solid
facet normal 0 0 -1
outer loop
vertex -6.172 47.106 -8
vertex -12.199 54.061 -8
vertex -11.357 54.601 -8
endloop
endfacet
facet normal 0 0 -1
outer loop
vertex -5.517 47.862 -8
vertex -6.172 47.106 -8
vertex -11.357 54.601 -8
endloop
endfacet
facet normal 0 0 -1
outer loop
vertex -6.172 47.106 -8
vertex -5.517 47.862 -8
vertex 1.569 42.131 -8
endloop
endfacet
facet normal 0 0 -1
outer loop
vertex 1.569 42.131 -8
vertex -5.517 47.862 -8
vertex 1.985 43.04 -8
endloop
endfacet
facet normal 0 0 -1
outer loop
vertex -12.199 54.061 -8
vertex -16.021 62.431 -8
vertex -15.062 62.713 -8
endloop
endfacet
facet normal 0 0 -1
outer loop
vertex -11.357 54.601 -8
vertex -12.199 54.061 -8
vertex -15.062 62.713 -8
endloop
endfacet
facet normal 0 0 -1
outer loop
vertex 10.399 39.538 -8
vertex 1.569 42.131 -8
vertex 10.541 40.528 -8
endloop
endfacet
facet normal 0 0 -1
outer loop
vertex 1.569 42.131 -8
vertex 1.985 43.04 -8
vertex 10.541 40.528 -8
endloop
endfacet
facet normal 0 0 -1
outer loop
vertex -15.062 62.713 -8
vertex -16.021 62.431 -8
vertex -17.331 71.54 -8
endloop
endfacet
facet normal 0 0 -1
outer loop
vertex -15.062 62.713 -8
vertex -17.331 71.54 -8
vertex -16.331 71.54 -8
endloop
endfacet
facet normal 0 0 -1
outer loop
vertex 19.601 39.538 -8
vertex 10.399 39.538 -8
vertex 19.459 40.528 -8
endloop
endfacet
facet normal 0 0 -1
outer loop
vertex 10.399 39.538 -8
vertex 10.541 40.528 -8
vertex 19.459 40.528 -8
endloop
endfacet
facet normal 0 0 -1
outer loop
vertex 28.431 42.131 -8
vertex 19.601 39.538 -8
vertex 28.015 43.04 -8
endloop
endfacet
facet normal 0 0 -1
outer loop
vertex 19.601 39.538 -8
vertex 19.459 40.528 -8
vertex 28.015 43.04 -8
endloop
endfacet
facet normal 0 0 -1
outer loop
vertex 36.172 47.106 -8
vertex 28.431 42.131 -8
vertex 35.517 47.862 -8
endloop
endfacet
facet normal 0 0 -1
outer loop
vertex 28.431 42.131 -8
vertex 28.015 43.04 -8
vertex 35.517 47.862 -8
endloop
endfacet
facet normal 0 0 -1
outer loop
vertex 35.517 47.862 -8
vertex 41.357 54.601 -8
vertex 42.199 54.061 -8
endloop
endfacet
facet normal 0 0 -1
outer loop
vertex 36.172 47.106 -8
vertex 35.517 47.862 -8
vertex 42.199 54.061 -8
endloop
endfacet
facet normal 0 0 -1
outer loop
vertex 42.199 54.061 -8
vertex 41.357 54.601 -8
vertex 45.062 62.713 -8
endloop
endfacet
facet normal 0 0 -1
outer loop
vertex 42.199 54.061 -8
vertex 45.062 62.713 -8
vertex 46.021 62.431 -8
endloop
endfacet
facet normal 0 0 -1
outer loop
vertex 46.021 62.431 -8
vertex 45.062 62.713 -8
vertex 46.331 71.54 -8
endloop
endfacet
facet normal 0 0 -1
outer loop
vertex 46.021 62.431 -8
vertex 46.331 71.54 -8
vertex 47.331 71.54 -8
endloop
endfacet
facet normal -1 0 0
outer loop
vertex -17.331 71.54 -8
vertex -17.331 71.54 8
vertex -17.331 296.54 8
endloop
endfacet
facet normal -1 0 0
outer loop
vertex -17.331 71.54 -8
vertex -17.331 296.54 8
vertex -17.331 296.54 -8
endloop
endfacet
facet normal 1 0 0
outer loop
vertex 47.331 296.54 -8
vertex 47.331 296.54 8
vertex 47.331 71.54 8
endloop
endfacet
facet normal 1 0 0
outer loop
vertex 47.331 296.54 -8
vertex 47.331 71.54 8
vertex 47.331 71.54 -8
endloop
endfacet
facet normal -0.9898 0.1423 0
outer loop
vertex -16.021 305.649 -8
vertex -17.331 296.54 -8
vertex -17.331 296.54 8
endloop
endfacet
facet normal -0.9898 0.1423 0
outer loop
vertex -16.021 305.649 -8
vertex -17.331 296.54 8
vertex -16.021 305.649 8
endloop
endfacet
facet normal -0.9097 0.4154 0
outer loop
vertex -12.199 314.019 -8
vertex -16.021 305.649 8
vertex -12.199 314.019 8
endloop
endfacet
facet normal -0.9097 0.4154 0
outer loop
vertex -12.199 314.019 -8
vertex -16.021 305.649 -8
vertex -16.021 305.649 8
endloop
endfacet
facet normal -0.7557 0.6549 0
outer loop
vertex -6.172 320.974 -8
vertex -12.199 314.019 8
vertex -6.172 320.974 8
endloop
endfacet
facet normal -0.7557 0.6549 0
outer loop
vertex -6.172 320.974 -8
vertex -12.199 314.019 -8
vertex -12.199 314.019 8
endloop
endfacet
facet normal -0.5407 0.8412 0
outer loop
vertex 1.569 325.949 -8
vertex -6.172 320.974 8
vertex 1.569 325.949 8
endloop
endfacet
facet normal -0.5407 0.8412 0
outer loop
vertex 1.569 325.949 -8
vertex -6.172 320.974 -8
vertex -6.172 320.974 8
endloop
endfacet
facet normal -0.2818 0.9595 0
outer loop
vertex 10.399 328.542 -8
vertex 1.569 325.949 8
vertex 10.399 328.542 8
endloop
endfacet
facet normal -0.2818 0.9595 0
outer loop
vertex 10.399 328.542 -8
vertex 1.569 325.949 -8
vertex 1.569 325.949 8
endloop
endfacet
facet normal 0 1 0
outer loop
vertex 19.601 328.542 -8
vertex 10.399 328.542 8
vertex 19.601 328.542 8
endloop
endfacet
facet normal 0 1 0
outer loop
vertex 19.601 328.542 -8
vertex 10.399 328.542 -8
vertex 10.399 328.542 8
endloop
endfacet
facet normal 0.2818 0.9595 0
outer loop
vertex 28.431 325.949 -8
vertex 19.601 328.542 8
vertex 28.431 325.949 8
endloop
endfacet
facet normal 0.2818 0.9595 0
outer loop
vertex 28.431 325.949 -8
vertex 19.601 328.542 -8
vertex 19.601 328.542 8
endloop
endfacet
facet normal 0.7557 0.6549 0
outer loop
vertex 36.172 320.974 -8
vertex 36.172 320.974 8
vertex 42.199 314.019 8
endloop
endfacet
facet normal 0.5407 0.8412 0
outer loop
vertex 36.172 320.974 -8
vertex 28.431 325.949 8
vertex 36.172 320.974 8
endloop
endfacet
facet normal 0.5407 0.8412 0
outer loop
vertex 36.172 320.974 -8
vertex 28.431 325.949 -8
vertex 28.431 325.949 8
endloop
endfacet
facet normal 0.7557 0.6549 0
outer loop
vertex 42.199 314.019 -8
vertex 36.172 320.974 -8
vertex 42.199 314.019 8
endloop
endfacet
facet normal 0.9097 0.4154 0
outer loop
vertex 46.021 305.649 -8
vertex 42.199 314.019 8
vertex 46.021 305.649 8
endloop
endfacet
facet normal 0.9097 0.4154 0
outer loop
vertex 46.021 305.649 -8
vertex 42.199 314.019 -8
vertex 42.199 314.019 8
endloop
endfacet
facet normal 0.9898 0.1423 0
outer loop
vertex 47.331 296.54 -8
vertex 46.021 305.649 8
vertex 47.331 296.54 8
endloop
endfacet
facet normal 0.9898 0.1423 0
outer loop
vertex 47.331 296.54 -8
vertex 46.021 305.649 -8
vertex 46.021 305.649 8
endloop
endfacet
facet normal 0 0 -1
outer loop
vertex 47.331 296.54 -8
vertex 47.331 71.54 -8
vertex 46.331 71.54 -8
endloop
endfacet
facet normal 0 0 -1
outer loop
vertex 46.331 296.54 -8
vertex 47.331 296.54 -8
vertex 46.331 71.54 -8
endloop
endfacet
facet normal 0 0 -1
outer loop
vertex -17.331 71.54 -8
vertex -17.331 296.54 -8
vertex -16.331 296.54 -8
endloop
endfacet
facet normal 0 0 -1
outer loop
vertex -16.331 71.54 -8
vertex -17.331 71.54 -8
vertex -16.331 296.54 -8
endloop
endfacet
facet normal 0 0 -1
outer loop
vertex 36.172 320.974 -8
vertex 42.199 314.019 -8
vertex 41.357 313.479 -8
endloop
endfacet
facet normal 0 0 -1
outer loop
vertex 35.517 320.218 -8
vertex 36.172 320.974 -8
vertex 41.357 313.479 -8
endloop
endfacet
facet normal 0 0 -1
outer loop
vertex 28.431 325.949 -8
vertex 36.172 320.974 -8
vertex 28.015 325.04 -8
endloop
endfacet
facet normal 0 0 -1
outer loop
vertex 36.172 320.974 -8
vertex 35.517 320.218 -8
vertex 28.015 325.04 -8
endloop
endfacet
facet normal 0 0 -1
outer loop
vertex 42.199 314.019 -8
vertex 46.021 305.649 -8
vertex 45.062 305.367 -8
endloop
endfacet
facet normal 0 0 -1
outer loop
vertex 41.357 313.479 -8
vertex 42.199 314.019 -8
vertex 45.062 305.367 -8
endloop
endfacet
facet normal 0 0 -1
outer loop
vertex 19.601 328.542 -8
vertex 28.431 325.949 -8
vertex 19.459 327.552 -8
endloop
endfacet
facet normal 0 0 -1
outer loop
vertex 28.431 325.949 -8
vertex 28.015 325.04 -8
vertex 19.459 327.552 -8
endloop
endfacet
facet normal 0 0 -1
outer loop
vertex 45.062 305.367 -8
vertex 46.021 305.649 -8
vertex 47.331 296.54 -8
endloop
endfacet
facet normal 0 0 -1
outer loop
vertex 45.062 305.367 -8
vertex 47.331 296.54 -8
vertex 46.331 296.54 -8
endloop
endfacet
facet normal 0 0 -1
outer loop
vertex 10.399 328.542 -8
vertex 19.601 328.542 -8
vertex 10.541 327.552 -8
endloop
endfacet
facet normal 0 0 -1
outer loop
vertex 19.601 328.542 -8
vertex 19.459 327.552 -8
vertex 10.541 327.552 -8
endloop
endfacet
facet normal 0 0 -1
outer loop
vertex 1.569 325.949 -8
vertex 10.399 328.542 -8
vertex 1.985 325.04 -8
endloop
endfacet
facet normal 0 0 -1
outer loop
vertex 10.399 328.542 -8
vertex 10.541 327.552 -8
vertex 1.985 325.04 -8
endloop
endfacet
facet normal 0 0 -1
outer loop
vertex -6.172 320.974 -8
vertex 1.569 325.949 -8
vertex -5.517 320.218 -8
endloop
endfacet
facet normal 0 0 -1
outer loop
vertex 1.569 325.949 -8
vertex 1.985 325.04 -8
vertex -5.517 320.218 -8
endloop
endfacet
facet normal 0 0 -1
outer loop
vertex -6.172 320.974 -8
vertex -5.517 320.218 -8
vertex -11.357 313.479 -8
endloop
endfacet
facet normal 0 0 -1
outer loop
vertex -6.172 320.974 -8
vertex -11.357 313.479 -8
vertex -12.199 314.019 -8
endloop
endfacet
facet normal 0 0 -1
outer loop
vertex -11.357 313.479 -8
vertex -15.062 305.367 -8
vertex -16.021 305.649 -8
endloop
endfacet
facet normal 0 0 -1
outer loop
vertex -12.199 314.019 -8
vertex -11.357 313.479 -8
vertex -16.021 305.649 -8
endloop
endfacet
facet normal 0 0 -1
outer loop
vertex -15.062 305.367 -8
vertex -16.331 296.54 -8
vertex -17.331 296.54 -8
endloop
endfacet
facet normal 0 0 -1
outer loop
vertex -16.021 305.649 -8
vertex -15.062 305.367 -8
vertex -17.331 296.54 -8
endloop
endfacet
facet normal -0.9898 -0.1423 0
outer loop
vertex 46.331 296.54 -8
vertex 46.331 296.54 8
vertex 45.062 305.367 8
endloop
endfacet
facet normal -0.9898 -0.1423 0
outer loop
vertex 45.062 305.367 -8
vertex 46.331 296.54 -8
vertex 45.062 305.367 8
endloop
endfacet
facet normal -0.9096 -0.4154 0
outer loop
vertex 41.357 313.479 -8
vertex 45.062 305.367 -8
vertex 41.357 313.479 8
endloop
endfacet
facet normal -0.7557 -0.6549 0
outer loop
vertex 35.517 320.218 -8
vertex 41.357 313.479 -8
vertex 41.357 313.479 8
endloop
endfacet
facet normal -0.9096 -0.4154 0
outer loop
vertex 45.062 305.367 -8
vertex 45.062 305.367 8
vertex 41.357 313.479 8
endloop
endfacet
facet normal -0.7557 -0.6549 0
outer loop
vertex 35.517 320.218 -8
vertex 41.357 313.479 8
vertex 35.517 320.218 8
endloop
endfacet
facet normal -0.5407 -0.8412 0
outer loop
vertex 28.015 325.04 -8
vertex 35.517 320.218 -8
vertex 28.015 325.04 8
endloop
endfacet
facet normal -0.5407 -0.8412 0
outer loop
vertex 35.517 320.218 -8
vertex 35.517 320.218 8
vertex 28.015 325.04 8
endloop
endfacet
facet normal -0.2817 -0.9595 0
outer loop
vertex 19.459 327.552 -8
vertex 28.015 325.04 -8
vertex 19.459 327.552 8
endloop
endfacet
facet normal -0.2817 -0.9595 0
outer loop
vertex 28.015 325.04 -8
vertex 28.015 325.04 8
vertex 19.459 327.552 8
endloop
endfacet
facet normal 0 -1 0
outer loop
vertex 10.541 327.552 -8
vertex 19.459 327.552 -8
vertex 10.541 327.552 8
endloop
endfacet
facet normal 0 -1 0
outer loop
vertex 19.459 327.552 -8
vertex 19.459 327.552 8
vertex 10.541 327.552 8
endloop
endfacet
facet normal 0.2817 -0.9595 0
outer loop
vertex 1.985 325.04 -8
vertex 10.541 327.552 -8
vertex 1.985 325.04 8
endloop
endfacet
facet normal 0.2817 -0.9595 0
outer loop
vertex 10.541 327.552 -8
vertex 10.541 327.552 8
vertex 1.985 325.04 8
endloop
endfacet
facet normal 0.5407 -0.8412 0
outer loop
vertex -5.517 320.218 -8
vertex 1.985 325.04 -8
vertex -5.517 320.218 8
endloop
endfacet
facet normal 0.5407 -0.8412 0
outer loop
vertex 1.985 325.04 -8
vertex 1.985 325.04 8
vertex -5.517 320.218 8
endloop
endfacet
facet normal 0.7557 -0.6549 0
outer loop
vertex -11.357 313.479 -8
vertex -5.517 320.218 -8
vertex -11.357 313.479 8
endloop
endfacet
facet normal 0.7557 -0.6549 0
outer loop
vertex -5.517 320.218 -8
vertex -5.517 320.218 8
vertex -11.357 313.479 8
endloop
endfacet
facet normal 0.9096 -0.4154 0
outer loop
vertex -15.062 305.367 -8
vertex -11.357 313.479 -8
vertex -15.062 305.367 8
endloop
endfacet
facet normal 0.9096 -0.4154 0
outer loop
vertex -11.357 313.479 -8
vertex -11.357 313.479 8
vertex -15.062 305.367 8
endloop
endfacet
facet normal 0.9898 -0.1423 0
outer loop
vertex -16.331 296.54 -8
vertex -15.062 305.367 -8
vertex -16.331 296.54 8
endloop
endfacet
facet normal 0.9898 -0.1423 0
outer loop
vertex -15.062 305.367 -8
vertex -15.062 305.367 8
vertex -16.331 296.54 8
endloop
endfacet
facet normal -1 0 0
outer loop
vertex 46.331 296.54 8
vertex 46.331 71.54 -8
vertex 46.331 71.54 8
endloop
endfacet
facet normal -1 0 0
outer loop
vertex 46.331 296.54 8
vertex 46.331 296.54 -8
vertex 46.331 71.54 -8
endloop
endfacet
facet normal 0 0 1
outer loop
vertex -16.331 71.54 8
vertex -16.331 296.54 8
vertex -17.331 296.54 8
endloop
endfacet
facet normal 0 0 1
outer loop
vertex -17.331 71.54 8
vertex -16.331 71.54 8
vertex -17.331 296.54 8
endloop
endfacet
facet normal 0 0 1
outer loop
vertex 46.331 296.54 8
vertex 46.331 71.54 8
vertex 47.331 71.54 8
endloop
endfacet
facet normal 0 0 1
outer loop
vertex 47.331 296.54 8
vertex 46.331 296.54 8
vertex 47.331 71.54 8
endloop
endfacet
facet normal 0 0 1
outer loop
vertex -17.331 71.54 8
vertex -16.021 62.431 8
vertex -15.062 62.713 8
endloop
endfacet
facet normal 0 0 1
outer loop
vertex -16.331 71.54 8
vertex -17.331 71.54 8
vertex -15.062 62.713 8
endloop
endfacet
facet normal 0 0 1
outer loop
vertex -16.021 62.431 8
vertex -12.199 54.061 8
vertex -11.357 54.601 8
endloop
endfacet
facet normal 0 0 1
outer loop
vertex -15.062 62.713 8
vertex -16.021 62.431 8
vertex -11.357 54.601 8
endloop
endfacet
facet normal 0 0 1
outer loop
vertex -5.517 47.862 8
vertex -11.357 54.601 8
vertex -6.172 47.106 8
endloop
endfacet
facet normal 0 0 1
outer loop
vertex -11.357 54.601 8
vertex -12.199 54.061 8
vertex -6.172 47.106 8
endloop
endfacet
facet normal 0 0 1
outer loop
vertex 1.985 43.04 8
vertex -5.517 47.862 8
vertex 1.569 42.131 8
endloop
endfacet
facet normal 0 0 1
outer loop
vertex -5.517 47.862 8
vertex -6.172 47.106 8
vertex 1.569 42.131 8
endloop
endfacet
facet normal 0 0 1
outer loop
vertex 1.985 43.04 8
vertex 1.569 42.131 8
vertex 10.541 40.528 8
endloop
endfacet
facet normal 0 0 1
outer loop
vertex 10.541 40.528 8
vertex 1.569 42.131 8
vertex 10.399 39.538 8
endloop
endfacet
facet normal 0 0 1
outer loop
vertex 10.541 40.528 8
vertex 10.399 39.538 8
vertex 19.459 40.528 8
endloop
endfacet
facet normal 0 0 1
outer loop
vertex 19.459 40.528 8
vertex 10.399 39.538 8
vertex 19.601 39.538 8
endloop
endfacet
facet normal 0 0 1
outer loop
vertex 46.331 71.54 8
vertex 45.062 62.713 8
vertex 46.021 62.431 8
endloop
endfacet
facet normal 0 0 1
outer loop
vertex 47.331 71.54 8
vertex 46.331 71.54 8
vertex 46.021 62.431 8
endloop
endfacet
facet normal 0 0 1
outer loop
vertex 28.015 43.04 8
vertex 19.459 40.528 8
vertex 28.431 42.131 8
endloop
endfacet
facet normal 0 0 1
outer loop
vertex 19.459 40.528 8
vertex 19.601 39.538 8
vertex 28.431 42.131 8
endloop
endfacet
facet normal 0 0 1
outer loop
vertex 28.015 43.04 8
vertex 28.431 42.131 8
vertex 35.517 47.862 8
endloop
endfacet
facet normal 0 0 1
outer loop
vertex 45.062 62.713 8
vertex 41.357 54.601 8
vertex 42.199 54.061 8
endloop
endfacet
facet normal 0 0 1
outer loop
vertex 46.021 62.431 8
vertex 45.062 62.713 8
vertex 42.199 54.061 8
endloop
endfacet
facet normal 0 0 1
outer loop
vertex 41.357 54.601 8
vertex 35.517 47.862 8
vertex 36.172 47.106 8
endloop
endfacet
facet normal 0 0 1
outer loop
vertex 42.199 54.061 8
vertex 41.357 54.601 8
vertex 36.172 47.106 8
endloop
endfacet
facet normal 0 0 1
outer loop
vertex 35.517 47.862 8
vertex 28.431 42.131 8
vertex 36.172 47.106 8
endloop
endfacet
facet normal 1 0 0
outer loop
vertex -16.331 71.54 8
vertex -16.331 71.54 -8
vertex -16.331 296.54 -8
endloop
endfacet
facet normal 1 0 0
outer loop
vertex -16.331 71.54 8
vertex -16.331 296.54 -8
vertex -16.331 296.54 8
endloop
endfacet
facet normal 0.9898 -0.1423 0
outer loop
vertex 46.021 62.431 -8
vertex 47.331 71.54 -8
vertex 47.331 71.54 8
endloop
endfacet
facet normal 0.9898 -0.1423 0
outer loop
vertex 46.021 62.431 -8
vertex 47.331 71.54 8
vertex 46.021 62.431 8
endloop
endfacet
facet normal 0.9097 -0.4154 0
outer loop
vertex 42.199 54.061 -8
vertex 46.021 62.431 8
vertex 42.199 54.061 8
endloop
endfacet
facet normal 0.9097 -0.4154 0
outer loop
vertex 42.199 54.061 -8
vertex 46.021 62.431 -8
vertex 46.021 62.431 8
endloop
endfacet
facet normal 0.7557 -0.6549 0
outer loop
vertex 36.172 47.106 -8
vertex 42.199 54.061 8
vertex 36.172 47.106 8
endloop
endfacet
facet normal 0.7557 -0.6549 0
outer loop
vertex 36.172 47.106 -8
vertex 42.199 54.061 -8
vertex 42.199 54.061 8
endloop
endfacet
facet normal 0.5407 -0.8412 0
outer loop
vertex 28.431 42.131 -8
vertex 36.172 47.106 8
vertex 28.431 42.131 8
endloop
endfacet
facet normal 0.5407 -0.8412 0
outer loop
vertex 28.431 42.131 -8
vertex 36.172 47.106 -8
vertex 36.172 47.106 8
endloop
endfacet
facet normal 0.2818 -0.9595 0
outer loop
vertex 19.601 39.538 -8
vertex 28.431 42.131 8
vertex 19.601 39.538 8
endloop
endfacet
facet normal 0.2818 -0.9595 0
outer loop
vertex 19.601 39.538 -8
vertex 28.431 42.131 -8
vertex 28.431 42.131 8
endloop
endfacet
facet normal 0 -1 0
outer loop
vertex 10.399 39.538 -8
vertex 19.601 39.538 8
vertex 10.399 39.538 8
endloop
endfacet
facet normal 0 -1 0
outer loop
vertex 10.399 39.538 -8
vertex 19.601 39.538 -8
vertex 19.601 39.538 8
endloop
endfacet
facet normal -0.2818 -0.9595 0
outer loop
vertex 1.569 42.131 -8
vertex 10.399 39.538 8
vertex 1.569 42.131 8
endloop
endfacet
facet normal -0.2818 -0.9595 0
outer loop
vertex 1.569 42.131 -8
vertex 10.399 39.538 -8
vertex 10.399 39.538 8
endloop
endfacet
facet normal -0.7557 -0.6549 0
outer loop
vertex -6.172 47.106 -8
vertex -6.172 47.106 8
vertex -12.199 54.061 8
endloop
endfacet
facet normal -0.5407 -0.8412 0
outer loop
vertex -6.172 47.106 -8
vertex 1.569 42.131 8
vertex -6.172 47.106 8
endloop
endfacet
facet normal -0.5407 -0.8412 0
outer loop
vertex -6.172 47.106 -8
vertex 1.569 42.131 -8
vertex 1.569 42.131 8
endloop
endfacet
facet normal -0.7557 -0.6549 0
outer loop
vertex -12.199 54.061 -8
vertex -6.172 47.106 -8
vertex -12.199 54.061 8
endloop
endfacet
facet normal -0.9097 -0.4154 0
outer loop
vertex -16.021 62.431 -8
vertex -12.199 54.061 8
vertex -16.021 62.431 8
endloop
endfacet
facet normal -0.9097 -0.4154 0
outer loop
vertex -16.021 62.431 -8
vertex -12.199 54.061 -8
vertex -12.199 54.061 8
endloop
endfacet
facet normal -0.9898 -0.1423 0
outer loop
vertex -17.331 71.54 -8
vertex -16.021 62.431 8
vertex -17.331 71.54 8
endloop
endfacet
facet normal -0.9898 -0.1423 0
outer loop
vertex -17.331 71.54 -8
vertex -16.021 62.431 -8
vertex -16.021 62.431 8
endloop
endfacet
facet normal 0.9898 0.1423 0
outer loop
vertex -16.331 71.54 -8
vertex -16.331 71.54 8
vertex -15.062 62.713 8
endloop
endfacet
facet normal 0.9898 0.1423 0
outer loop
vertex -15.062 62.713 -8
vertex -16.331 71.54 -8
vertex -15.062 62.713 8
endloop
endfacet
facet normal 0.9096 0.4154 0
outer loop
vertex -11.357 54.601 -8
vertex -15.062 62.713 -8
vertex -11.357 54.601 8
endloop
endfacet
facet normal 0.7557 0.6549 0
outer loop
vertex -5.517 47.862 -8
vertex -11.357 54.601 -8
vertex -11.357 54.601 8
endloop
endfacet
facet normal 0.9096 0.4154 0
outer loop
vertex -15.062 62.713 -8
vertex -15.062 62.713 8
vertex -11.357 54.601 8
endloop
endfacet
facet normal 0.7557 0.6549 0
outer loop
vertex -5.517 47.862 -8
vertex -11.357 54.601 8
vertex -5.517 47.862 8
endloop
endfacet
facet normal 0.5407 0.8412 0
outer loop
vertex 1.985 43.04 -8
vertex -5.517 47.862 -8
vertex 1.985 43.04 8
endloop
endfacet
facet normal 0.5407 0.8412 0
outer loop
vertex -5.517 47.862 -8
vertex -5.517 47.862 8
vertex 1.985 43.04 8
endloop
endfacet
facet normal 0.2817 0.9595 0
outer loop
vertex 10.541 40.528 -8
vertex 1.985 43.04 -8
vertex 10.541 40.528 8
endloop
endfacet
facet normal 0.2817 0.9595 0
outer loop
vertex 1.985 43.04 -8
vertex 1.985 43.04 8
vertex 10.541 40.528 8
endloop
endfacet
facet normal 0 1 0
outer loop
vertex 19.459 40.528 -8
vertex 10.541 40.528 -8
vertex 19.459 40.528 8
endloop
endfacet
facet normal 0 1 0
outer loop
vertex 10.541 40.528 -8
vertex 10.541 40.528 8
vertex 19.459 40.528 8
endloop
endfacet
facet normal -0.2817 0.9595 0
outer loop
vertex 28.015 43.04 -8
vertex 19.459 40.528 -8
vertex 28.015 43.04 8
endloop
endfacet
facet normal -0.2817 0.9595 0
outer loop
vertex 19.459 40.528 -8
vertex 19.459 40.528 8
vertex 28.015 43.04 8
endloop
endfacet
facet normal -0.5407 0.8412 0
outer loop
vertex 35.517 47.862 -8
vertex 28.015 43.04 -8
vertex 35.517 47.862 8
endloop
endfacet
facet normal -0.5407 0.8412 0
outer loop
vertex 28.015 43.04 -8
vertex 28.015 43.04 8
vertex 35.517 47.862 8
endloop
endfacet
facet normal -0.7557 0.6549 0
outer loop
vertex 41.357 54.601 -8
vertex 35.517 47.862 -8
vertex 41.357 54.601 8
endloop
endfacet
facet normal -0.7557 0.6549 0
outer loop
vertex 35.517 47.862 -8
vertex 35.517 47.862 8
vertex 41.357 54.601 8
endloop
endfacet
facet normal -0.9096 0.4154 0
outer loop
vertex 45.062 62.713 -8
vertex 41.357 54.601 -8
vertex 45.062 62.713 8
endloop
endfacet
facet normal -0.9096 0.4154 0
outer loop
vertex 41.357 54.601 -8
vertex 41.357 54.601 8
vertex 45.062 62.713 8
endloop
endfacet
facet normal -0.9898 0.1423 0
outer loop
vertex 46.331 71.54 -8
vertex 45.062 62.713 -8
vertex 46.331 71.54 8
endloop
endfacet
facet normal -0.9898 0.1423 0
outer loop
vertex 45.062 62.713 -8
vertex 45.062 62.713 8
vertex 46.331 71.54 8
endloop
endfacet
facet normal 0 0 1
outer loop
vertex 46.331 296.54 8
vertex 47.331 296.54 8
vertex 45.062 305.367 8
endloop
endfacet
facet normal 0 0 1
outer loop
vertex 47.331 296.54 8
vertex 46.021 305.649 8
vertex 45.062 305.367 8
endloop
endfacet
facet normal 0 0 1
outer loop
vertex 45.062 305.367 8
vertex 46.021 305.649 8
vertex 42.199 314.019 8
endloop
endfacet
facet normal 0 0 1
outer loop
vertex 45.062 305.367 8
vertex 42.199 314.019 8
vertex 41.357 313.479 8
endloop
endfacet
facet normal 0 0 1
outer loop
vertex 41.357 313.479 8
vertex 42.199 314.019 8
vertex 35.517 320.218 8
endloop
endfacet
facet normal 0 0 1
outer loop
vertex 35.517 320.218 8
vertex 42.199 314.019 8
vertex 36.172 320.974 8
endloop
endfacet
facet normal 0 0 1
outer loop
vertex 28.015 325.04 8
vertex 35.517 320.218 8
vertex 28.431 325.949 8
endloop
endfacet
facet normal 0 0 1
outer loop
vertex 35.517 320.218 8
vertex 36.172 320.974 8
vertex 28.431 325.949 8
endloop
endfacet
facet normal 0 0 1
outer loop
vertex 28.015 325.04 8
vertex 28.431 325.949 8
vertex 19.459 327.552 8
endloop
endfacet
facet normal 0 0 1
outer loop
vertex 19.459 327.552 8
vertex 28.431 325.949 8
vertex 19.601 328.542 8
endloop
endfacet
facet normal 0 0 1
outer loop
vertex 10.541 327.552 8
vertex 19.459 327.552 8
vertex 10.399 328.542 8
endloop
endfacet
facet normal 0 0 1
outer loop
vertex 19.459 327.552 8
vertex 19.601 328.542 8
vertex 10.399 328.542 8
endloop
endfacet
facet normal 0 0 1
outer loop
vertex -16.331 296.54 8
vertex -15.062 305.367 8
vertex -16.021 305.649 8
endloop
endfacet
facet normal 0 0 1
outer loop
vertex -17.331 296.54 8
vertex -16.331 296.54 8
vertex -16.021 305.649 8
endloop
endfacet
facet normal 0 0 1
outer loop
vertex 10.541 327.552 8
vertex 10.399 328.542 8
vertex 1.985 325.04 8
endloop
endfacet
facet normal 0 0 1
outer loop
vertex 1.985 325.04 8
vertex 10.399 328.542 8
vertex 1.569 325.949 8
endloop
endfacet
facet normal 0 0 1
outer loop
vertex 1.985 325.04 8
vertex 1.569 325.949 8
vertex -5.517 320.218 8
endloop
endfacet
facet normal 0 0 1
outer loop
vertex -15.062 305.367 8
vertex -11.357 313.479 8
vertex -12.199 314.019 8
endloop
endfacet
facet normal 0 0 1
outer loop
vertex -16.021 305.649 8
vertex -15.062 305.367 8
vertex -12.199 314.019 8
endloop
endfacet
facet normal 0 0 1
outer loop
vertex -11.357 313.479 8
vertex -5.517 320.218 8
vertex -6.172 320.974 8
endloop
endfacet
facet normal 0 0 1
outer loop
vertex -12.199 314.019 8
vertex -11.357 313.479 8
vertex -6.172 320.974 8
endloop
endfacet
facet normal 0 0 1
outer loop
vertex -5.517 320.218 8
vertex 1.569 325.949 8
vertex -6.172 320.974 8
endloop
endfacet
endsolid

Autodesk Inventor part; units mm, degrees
sketch "Sketch Path" plane through (0, 0, 0) normal (0, 0, 1) x (1, 0, 0)
  arc A0 (46.831, 296.54) -> (-16.831, 296.54) centre (15, 296.54) ccw
  arc A1 (-16.831, 71.54) -> (46.831, 71.54) centre (15, 71.54) ccw
  line L0 (-16.831, 71.54) -> (-16.831, 296.54)
  line L1 (46.831, 296.54) -> (46.831, 71.54)
ref_plane "Cross Section Plane" through (-16.831, 296.54, 0) normal (0, -1, 0) x (0, 0, 1)
ref_plane "Work Plane2" through (15, 296.54, 0) normal (-1, 0, 0) x (0, 0, 1)
ref_plane "Work Plane3" through (15, 71.54, 0) normal (0.1564, 0.9877, 0) x (0, 0, 1)
sketch "Cross Section" plane through (-16.831, 296.54, 0) normal (0, -1, 0) x (0, 0, 1)
  line L0 (-8, 0.5) -> (8, 0.5)
  line L1 (8, 0.5) -> (8, -0.5)
  line L2 (8, -0.5) -> (-8, -0.5)
  line L3 (-8, -0.5) -> (-8, 0.5)
  line L4 (-8, 0) -> (8, 0) construction
  point P0 (0, 0)
  point P1 (0, 0)
  dimension "d0" = 16
  dimension "d4" = 0.5
  dimension "d5" = 0.5
sweep "Belt" add profiles "Cross Section" path "Sketch Path"
equation "\"d0\" = da_B"
equation "\"d4\" = da_a"
equation "\"d5\" = da_a2"
equation "\"da_B\" = 16"
equation "\"da_pb\" = 5"
equation "\"da_a\" = 0.5"
equation "\"da_S\" = 2.65"
equation "\"da_Beta\" = 20deg"
equation "\"da_Ht\" = 1.2"
equation "\"da_H\" = 3.4"
equation "\"da_a2\" = 0.5"
properties part number "Synchronous Belt" material "Rubber"
